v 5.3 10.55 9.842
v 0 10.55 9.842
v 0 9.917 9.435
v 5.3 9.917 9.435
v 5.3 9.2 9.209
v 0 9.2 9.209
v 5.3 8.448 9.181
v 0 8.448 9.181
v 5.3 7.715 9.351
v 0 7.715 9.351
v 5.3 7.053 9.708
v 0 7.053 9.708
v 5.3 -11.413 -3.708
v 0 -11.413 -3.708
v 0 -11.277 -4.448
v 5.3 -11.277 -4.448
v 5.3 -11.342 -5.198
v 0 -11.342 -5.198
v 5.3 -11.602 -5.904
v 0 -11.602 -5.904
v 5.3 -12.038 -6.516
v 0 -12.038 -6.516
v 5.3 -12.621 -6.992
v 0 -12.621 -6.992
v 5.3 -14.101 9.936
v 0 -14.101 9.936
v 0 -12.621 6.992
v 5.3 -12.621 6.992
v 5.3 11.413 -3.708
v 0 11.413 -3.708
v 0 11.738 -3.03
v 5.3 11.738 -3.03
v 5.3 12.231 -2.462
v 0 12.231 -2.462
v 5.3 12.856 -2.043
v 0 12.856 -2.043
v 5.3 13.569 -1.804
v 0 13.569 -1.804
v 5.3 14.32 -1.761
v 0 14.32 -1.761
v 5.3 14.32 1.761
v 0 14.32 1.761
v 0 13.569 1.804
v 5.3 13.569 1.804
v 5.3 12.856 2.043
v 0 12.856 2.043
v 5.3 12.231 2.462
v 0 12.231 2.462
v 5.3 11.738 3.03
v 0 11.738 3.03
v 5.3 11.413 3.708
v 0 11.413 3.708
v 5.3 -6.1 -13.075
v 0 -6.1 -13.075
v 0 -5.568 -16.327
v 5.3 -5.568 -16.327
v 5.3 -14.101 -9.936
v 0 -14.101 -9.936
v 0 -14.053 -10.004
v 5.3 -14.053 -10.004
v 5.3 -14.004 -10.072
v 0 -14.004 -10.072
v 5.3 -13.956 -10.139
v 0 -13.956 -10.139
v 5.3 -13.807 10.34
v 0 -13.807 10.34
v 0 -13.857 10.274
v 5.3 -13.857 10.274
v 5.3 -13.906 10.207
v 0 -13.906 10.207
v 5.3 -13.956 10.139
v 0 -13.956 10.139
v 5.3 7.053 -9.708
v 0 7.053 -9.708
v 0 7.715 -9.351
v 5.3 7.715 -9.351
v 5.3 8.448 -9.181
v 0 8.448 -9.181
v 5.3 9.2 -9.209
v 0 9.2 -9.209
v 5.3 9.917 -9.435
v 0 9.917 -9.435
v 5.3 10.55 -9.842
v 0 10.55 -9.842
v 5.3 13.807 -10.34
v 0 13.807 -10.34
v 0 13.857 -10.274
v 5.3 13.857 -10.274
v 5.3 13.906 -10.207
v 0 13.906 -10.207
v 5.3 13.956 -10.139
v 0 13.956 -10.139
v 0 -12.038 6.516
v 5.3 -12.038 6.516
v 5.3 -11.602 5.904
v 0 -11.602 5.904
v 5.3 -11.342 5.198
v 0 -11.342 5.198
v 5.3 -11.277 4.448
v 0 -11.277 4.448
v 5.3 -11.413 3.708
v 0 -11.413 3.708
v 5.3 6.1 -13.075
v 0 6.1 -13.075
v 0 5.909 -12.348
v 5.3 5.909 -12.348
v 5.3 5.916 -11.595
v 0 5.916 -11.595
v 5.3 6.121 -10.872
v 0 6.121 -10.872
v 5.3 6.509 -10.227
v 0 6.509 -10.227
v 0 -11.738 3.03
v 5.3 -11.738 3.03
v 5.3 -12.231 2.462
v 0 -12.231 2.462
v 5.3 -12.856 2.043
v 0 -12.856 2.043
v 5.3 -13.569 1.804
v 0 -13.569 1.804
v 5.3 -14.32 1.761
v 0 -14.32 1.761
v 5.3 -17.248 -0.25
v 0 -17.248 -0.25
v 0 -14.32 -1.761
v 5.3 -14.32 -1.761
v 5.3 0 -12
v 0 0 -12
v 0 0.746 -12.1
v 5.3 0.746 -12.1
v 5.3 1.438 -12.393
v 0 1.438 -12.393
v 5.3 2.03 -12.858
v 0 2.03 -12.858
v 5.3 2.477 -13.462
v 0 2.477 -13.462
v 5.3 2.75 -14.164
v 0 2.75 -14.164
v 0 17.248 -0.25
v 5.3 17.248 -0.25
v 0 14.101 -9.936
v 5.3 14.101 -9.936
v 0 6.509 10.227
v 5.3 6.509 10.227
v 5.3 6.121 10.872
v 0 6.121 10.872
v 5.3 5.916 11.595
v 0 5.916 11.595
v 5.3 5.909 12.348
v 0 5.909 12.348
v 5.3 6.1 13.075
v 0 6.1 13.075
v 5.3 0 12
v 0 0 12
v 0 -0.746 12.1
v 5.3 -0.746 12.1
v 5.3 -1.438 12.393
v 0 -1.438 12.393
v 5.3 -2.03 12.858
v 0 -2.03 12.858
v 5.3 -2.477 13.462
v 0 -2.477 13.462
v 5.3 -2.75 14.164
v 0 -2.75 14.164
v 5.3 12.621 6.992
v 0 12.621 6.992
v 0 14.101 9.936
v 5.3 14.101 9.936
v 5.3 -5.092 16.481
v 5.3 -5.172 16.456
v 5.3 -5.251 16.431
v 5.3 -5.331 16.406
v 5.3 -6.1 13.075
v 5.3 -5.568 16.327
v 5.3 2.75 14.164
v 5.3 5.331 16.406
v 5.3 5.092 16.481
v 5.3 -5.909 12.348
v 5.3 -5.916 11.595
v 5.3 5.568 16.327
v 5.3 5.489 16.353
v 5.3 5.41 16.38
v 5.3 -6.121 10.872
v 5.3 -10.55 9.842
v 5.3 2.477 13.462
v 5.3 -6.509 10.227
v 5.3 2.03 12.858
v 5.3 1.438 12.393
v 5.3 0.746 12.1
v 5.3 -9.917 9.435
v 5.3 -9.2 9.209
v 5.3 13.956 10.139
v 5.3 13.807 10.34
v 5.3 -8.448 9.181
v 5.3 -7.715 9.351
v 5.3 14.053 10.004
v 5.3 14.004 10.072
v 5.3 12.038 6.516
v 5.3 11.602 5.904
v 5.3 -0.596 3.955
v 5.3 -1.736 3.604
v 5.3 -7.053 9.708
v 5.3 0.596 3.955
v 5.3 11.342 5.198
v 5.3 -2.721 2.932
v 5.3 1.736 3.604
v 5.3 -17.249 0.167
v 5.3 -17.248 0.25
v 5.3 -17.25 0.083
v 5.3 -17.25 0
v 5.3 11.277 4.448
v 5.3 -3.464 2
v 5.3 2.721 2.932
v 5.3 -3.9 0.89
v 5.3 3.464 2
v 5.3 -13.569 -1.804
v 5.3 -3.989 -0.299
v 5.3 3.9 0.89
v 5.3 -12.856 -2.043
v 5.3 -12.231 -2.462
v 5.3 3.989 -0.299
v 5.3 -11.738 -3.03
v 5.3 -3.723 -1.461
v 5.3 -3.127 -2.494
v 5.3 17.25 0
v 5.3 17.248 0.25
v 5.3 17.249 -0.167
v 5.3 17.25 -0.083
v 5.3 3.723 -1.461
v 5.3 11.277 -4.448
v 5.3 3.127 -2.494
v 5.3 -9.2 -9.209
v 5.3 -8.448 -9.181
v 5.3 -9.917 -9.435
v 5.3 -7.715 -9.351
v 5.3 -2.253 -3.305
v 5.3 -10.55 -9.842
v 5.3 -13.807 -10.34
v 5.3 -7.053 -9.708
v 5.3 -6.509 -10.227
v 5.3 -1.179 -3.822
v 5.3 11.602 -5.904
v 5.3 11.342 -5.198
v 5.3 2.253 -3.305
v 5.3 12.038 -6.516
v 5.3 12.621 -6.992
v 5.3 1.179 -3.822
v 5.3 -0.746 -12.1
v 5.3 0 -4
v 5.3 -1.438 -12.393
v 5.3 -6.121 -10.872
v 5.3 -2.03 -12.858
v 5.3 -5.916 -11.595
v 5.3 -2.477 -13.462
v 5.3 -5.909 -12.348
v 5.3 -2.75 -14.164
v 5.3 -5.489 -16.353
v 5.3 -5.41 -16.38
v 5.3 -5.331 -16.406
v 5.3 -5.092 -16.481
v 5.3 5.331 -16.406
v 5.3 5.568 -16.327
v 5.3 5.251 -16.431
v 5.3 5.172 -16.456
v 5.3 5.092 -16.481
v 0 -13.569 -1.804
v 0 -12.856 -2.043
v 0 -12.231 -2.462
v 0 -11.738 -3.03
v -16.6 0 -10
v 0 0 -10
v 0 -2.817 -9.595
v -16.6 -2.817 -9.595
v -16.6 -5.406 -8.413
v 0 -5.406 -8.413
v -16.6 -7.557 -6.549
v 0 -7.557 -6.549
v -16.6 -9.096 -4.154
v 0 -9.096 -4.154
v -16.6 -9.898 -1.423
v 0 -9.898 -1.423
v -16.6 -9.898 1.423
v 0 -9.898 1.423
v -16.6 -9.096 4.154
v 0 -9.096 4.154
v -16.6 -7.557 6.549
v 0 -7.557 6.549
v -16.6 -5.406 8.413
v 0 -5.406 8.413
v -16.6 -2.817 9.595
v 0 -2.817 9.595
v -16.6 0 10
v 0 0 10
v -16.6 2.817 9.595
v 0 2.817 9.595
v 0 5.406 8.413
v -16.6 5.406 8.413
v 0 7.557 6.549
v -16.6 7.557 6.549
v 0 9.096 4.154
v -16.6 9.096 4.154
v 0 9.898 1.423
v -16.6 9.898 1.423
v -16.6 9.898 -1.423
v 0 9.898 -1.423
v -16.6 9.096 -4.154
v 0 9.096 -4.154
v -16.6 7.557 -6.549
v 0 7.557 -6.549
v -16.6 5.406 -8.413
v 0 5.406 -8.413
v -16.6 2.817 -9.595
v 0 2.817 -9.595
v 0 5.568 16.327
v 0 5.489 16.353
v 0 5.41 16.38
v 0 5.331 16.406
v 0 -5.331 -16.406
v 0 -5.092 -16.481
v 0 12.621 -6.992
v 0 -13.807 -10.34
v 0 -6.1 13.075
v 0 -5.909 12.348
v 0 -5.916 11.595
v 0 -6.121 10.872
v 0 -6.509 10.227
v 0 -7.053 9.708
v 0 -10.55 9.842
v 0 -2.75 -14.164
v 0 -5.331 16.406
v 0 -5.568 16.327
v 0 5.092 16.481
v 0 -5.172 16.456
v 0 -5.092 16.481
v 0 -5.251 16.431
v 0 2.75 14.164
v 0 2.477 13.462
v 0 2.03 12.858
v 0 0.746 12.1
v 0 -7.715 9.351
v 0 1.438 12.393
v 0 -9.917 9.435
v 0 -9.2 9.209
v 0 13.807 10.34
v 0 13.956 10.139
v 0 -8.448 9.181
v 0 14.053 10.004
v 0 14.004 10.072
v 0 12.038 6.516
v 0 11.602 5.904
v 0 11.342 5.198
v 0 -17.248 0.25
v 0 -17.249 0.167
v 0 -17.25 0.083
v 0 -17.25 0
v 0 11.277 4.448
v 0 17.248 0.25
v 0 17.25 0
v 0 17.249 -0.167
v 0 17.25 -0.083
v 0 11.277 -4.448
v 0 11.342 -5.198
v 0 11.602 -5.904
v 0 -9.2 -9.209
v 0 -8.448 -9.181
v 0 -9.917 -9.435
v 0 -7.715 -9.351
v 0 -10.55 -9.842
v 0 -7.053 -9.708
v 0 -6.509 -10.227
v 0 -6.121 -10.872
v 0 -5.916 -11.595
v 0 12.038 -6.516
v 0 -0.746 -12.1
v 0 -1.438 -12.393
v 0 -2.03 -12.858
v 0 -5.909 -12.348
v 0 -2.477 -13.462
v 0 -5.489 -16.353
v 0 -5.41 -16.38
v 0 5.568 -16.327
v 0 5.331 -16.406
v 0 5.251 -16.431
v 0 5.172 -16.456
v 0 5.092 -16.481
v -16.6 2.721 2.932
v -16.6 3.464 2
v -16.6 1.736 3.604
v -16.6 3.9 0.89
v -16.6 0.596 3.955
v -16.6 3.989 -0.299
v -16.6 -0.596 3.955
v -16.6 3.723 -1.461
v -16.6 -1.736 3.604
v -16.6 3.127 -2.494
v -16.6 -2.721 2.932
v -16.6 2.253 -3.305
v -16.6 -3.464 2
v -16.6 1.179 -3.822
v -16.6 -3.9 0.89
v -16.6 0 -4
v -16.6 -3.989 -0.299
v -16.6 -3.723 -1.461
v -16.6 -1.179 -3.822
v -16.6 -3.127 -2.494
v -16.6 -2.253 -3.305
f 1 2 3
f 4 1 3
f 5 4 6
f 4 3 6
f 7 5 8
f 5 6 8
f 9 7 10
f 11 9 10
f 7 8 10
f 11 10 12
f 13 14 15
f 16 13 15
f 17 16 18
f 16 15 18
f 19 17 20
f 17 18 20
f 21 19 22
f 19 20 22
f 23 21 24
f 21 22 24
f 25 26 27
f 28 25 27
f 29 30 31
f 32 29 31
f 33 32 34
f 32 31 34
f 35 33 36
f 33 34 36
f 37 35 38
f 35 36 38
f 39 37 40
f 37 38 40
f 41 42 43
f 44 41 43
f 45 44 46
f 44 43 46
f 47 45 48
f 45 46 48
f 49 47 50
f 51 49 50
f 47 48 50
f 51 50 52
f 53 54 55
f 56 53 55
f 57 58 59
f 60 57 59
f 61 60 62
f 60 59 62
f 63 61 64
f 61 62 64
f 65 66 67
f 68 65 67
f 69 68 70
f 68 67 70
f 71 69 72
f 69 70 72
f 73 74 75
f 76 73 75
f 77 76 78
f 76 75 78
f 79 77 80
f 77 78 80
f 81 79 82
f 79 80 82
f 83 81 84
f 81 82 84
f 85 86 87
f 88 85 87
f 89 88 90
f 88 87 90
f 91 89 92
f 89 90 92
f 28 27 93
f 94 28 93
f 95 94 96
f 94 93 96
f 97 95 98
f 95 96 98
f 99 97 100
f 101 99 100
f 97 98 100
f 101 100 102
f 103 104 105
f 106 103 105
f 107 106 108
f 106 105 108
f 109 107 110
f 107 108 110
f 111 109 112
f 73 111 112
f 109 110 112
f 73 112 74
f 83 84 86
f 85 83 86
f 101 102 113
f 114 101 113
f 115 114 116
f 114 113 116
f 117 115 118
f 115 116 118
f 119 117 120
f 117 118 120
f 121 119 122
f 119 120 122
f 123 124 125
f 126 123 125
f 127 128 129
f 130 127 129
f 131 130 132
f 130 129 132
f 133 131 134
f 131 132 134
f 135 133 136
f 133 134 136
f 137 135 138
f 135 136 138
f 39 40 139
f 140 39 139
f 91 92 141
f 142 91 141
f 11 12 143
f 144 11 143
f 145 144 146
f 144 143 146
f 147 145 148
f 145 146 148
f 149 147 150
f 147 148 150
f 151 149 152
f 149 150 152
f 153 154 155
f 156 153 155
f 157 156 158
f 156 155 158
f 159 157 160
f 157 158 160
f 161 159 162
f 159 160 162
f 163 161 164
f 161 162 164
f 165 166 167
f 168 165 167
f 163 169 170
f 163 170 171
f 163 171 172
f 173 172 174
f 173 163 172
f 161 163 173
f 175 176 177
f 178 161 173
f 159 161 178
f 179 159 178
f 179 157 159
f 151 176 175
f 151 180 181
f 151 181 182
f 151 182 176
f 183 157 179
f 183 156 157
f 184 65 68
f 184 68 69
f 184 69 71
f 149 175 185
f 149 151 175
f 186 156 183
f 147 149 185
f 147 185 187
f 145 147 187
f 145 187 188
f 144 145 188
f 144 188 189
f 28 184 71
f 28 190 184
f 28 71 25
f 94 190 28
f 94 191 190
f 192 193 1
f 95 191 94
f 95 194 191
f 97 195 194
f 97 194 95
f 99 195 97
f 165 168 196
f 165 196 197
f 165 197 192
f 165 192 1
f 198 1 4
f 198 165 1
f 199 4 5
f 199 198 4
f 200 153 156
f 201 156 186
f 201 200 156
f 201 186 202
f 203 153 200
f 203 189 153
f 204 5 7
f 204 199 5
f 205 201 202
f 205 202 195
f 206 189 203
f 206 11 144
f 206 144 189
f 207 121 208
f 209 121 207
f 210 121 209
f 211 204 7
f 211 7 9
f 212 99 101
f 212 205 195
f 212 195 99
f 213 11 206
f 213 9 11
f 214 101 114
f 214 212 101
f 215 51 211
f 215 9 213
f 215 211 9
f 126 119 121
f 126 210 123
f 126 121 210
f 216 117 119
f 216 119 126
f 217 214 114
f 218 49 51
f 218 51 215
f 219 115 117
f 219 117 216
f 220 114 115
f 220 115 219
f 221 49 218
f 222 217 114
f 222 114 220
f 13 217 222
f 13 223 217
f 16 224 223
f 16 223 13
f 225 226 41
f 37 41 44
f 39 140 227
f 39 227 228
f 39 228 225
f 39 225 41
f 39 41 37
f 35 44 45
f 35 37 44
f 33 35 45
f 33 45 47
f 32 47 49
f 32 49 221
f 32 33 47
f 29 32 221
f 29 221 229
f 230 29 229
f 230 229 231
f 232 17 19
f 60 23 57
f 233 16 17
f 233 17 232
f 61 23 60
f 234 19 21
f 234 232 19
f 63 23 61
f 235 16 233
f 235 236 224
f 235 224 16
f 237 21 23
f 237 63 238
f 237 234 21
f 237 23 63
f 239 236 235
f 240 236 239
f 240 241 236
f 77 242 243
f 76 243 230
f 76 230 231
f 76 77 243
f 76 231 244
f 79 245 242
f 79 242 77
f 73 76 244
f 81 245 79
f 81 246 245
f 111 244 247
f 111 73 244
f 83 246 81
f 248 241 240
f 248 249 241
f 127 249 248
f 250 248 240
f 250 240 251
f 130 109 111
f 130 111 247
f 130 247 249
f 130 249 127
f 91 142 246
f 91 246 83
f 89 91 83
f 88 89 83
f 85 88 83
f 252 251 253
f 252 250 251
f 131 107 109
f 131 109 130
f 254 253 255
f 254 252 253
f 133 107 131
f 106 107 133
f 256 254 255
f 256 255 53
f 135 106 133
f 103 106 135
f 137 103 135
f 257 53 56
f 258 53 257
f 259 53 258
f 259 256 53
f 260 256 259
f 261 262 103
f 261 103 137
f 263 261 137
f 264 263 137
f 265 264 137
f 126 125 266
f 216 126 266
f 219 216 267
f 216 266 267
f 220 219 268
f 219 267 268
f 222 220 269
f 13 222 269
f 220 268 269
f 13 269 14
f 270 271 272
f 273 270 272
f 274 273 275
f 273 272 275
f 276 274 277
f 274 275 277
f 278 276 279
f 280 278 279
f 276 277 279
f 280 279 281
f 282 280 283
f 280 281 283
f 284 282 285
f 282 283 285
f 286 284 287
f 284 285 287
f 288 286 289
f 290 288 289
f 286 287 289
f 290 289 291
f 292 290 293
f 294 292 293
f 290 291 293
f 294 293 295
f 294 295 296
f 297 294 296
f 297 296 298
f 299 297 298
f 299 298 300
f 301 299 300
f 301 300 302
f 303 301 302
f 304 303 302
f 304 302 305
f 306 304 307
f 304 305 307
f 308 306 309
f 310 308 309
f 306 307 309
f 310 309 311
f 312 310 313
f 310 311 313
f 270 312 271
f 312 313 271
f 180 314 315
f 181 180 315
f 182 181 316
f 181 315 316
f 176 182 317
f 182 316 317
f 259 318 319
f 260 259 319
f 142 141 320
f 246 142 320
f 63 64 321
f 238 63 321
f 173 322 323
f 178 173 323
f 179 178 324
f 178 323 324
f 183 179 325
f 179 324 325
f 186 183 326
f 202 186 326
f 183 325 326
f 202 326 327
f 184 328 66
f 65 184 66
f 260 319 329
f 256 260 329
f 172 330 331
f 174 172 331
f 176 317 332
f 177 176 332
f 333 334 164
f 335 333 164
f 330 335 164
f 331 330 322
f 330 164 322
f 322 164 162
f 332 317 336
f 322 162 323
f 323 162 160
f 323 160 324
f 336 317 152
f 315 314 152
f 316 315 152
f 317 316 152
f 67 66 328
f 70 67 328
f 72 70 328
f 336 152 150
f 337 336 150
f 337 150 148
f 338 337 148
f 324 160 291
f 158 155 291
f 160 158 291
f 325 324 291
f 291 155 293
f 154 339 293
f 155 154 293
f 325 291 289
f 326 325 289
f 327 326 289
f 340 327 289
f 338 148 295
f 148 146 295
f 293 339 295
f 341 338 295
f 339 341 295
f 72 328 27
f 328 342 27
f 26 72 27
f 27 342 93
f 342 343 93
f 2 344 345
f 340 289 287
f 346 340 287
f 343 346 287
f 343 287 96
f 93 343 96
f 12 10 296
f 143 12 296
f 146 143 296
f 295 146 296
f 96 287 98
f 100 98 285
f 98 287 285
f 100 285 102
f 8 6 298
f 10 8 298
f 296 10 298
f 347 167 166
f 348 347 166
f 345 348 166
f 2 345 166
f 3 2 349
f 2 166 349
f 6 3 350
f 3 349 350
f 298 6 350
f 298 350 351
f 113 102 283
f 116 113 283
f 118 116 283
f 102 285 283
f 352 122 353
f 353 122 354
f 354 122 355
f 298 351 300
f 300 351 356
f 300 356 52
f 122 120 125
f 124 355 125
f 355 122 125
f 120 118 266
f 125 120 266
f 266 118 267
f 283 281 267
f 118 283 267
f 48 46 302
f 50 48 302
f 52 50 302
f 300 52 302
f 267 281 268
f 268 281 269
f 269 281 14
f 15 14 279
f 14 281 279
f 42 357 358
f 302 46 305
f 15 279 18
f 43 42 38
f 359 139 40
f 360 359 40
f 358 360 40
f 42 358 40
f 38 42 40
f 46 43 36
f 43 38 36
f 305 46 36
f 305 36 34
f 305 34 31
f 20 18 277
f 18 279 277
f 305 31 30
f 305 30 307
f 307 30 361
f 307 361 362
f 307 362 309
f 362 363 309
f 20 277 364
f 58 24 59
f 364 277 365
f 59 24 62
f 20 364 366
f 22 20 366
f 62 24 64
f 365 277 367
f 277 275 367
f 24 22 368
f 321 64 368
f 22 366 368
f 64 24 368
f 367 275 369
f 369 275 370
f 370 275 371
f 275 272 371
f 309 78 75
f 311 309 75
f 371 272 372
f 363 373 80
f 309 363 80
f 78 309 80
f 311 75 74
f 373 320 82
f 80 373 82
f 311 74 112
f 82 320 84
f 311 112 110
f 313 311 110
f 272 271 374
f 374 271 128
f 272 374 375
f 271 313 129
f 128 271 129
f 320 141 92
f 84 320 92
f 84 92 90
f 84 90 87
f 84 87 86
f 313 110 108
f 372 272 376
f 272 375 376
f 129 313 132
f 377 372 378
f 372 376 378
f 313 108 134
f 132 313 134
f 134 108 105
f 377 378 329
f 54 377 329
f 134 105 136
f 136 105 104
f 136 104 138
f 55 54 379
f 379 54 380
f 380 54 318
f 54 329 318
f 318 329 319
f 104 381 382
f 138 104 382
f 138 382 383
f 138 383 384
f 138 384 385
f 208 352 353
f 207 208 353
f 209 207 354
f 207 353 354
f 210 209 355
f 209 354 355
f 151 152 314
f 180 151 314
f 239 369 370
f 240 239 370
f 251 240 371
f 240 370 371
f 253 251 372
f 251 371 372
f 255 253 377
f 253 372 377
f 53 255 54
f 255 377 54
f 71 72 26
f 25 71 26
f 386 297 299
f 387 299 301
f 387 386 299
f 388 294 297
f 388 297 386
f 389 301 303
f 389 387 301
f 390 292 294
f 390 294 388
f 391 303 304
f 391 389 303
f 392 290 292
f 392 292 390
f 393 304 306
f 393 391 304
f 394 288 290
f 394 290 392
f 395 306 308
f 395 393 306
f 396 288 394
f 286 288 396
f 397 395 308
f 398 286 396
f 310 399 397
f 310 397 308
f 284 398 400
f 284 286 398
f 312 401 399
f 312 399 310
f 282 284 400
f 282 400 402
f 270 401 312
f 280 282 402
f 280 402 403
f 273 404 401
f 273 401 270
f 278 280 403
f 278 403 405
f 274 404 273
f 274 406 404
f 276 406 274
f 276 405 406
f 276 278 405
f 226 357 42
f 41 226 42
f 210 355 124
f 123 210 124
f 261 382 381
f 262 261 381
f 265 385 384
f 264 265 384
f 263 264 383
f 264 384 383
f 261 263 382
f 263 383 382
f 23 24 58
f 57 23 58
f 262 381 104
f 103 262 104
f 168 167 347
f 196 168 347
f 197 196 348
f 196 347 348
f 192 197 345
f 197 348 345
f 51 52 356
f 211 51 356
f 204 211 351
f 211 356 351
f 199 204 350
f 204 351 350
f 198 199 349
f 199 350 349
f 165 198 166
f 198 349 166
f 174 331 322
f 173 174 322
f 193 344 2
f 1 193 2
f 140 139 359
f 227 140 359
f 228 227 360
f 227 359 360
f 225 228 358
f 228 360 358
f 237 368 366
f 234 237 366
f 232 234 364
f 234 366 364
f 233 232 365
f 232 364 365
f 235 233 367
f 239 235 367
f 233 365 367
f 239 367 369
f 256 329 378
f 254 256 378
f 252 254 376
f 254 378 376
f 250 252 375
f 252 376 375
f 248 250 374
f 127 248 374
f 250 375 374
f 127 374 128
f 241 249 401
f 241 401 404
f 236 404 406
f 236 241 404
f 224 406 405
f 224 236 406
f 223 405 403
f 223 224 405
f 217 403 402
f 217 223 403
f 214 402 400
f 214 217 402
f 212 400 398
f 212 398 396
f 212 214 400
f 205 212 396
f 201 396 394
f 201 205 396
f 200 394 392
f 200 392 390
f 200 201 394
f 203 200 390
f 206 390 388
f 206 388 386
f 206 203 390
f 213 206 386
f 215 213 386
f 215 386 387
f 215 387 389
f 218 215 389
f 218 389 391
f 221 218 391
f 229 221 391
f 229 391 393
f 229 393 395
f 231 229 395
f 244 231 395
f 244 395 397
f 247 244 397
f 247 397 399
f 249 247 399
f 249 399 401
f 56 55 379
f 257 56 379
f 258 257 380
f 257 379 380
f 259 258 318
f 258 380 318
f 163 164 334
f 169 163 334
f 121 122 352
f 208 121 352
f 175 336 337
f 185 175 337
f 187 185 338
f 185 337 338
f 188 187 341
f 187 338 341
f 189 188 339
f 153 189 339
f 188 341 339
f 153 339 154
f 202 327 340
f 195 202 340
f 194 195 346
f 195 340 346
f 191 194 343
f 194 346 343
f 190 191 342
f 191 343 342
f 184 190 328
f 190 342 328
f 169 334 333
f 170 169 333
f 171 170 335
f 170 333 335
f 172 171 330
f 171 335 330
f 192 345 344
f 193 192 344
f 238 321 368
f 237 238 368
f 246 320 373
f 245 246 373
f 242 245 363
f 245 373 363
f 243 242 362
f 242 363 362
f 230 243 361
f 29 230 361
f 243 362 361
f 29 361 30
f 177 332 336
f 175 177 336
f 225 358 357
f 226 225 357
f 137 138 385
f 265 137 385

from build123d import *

# Parameters (mm, degrees)
BOSS_EXTRUDE1_DEPTH = 5.3
CIRPATTERN2_COUNT   = 10
SKETCH2_R           = 10
SKETCH2_R_2         = 4
BOSS_EXTRUDE2_DEPTH = 16.6
CUT_EXTRUDE2_START  = -16.6
SKETCH2_2_R         = 4
CUT_EXTRUDE2_DEPTH  = 16.6


with BuildPart() as part:
    # Sketch1 → Boss-Extrude1 (new body)
    with BuildSketch(Plane(origin=(0, 0, 0), x_dir=(0, 0, -1), z_dir=(1, 0, 0))):
        with BuildLine():
            Line((0, 0), (10.139295602, 13.955543153))
            Line((10.139295602, 13.955543153), (9.935981835, 14.101019997))
            Line((9.935981835, 14.101019997), (6.992185789, 12.620548152))
            ThreePointArc((6.992185789, 12.620548152), (3.708203932, 11.412678196), (1.761374949, 14.320141621))
            Line((1.761374949, 14.320141621), (0.249993436, 17.248188406))
            ThreePointArc((0.249993436, 17.248188406), (0.125, 17.249547096), (0, 17.25))
            Line((0, 17.25), (0, 0))
        make_face()
    boss_extrude1 = extrude(amount=BOSS_EXTRUDE1_DEPTH)

    # CirPattern2: Boss-Extrude1 ×10 about axis
    cirpattern2_axis = Axis((5.3, 0, 0), (-1, 0, 0))
    for i in range(1, CIRPATTERN2_COUNT):
        add(boss_extrude1.rotate(cirpattern2_axis, i * 360 / CIRPATTERN2_COUNT))

    # Sketch2 → Boss-Extrude2 (add)
    with BuildSketch(Plane.ZY):
        Circle(SKETCH2_R)
        Circle(SKETCH2_R_2, mode=Mode.SUBTRACT)
    extrude(amount=BOSS_EXTRUDE2_DEPTH)

    # Sketch2<2> → Cut-Extrude2 (cut)
    with BuildSketch(Plane.ZY.offset(CUT_EXTRUDE2_START)):
        Circle(SKETCH2_2_R)
    extrude(amount=CUT_EXTRUDE2_DEPTH, mode=Mode.SUBTRACT)


solid = part.part
